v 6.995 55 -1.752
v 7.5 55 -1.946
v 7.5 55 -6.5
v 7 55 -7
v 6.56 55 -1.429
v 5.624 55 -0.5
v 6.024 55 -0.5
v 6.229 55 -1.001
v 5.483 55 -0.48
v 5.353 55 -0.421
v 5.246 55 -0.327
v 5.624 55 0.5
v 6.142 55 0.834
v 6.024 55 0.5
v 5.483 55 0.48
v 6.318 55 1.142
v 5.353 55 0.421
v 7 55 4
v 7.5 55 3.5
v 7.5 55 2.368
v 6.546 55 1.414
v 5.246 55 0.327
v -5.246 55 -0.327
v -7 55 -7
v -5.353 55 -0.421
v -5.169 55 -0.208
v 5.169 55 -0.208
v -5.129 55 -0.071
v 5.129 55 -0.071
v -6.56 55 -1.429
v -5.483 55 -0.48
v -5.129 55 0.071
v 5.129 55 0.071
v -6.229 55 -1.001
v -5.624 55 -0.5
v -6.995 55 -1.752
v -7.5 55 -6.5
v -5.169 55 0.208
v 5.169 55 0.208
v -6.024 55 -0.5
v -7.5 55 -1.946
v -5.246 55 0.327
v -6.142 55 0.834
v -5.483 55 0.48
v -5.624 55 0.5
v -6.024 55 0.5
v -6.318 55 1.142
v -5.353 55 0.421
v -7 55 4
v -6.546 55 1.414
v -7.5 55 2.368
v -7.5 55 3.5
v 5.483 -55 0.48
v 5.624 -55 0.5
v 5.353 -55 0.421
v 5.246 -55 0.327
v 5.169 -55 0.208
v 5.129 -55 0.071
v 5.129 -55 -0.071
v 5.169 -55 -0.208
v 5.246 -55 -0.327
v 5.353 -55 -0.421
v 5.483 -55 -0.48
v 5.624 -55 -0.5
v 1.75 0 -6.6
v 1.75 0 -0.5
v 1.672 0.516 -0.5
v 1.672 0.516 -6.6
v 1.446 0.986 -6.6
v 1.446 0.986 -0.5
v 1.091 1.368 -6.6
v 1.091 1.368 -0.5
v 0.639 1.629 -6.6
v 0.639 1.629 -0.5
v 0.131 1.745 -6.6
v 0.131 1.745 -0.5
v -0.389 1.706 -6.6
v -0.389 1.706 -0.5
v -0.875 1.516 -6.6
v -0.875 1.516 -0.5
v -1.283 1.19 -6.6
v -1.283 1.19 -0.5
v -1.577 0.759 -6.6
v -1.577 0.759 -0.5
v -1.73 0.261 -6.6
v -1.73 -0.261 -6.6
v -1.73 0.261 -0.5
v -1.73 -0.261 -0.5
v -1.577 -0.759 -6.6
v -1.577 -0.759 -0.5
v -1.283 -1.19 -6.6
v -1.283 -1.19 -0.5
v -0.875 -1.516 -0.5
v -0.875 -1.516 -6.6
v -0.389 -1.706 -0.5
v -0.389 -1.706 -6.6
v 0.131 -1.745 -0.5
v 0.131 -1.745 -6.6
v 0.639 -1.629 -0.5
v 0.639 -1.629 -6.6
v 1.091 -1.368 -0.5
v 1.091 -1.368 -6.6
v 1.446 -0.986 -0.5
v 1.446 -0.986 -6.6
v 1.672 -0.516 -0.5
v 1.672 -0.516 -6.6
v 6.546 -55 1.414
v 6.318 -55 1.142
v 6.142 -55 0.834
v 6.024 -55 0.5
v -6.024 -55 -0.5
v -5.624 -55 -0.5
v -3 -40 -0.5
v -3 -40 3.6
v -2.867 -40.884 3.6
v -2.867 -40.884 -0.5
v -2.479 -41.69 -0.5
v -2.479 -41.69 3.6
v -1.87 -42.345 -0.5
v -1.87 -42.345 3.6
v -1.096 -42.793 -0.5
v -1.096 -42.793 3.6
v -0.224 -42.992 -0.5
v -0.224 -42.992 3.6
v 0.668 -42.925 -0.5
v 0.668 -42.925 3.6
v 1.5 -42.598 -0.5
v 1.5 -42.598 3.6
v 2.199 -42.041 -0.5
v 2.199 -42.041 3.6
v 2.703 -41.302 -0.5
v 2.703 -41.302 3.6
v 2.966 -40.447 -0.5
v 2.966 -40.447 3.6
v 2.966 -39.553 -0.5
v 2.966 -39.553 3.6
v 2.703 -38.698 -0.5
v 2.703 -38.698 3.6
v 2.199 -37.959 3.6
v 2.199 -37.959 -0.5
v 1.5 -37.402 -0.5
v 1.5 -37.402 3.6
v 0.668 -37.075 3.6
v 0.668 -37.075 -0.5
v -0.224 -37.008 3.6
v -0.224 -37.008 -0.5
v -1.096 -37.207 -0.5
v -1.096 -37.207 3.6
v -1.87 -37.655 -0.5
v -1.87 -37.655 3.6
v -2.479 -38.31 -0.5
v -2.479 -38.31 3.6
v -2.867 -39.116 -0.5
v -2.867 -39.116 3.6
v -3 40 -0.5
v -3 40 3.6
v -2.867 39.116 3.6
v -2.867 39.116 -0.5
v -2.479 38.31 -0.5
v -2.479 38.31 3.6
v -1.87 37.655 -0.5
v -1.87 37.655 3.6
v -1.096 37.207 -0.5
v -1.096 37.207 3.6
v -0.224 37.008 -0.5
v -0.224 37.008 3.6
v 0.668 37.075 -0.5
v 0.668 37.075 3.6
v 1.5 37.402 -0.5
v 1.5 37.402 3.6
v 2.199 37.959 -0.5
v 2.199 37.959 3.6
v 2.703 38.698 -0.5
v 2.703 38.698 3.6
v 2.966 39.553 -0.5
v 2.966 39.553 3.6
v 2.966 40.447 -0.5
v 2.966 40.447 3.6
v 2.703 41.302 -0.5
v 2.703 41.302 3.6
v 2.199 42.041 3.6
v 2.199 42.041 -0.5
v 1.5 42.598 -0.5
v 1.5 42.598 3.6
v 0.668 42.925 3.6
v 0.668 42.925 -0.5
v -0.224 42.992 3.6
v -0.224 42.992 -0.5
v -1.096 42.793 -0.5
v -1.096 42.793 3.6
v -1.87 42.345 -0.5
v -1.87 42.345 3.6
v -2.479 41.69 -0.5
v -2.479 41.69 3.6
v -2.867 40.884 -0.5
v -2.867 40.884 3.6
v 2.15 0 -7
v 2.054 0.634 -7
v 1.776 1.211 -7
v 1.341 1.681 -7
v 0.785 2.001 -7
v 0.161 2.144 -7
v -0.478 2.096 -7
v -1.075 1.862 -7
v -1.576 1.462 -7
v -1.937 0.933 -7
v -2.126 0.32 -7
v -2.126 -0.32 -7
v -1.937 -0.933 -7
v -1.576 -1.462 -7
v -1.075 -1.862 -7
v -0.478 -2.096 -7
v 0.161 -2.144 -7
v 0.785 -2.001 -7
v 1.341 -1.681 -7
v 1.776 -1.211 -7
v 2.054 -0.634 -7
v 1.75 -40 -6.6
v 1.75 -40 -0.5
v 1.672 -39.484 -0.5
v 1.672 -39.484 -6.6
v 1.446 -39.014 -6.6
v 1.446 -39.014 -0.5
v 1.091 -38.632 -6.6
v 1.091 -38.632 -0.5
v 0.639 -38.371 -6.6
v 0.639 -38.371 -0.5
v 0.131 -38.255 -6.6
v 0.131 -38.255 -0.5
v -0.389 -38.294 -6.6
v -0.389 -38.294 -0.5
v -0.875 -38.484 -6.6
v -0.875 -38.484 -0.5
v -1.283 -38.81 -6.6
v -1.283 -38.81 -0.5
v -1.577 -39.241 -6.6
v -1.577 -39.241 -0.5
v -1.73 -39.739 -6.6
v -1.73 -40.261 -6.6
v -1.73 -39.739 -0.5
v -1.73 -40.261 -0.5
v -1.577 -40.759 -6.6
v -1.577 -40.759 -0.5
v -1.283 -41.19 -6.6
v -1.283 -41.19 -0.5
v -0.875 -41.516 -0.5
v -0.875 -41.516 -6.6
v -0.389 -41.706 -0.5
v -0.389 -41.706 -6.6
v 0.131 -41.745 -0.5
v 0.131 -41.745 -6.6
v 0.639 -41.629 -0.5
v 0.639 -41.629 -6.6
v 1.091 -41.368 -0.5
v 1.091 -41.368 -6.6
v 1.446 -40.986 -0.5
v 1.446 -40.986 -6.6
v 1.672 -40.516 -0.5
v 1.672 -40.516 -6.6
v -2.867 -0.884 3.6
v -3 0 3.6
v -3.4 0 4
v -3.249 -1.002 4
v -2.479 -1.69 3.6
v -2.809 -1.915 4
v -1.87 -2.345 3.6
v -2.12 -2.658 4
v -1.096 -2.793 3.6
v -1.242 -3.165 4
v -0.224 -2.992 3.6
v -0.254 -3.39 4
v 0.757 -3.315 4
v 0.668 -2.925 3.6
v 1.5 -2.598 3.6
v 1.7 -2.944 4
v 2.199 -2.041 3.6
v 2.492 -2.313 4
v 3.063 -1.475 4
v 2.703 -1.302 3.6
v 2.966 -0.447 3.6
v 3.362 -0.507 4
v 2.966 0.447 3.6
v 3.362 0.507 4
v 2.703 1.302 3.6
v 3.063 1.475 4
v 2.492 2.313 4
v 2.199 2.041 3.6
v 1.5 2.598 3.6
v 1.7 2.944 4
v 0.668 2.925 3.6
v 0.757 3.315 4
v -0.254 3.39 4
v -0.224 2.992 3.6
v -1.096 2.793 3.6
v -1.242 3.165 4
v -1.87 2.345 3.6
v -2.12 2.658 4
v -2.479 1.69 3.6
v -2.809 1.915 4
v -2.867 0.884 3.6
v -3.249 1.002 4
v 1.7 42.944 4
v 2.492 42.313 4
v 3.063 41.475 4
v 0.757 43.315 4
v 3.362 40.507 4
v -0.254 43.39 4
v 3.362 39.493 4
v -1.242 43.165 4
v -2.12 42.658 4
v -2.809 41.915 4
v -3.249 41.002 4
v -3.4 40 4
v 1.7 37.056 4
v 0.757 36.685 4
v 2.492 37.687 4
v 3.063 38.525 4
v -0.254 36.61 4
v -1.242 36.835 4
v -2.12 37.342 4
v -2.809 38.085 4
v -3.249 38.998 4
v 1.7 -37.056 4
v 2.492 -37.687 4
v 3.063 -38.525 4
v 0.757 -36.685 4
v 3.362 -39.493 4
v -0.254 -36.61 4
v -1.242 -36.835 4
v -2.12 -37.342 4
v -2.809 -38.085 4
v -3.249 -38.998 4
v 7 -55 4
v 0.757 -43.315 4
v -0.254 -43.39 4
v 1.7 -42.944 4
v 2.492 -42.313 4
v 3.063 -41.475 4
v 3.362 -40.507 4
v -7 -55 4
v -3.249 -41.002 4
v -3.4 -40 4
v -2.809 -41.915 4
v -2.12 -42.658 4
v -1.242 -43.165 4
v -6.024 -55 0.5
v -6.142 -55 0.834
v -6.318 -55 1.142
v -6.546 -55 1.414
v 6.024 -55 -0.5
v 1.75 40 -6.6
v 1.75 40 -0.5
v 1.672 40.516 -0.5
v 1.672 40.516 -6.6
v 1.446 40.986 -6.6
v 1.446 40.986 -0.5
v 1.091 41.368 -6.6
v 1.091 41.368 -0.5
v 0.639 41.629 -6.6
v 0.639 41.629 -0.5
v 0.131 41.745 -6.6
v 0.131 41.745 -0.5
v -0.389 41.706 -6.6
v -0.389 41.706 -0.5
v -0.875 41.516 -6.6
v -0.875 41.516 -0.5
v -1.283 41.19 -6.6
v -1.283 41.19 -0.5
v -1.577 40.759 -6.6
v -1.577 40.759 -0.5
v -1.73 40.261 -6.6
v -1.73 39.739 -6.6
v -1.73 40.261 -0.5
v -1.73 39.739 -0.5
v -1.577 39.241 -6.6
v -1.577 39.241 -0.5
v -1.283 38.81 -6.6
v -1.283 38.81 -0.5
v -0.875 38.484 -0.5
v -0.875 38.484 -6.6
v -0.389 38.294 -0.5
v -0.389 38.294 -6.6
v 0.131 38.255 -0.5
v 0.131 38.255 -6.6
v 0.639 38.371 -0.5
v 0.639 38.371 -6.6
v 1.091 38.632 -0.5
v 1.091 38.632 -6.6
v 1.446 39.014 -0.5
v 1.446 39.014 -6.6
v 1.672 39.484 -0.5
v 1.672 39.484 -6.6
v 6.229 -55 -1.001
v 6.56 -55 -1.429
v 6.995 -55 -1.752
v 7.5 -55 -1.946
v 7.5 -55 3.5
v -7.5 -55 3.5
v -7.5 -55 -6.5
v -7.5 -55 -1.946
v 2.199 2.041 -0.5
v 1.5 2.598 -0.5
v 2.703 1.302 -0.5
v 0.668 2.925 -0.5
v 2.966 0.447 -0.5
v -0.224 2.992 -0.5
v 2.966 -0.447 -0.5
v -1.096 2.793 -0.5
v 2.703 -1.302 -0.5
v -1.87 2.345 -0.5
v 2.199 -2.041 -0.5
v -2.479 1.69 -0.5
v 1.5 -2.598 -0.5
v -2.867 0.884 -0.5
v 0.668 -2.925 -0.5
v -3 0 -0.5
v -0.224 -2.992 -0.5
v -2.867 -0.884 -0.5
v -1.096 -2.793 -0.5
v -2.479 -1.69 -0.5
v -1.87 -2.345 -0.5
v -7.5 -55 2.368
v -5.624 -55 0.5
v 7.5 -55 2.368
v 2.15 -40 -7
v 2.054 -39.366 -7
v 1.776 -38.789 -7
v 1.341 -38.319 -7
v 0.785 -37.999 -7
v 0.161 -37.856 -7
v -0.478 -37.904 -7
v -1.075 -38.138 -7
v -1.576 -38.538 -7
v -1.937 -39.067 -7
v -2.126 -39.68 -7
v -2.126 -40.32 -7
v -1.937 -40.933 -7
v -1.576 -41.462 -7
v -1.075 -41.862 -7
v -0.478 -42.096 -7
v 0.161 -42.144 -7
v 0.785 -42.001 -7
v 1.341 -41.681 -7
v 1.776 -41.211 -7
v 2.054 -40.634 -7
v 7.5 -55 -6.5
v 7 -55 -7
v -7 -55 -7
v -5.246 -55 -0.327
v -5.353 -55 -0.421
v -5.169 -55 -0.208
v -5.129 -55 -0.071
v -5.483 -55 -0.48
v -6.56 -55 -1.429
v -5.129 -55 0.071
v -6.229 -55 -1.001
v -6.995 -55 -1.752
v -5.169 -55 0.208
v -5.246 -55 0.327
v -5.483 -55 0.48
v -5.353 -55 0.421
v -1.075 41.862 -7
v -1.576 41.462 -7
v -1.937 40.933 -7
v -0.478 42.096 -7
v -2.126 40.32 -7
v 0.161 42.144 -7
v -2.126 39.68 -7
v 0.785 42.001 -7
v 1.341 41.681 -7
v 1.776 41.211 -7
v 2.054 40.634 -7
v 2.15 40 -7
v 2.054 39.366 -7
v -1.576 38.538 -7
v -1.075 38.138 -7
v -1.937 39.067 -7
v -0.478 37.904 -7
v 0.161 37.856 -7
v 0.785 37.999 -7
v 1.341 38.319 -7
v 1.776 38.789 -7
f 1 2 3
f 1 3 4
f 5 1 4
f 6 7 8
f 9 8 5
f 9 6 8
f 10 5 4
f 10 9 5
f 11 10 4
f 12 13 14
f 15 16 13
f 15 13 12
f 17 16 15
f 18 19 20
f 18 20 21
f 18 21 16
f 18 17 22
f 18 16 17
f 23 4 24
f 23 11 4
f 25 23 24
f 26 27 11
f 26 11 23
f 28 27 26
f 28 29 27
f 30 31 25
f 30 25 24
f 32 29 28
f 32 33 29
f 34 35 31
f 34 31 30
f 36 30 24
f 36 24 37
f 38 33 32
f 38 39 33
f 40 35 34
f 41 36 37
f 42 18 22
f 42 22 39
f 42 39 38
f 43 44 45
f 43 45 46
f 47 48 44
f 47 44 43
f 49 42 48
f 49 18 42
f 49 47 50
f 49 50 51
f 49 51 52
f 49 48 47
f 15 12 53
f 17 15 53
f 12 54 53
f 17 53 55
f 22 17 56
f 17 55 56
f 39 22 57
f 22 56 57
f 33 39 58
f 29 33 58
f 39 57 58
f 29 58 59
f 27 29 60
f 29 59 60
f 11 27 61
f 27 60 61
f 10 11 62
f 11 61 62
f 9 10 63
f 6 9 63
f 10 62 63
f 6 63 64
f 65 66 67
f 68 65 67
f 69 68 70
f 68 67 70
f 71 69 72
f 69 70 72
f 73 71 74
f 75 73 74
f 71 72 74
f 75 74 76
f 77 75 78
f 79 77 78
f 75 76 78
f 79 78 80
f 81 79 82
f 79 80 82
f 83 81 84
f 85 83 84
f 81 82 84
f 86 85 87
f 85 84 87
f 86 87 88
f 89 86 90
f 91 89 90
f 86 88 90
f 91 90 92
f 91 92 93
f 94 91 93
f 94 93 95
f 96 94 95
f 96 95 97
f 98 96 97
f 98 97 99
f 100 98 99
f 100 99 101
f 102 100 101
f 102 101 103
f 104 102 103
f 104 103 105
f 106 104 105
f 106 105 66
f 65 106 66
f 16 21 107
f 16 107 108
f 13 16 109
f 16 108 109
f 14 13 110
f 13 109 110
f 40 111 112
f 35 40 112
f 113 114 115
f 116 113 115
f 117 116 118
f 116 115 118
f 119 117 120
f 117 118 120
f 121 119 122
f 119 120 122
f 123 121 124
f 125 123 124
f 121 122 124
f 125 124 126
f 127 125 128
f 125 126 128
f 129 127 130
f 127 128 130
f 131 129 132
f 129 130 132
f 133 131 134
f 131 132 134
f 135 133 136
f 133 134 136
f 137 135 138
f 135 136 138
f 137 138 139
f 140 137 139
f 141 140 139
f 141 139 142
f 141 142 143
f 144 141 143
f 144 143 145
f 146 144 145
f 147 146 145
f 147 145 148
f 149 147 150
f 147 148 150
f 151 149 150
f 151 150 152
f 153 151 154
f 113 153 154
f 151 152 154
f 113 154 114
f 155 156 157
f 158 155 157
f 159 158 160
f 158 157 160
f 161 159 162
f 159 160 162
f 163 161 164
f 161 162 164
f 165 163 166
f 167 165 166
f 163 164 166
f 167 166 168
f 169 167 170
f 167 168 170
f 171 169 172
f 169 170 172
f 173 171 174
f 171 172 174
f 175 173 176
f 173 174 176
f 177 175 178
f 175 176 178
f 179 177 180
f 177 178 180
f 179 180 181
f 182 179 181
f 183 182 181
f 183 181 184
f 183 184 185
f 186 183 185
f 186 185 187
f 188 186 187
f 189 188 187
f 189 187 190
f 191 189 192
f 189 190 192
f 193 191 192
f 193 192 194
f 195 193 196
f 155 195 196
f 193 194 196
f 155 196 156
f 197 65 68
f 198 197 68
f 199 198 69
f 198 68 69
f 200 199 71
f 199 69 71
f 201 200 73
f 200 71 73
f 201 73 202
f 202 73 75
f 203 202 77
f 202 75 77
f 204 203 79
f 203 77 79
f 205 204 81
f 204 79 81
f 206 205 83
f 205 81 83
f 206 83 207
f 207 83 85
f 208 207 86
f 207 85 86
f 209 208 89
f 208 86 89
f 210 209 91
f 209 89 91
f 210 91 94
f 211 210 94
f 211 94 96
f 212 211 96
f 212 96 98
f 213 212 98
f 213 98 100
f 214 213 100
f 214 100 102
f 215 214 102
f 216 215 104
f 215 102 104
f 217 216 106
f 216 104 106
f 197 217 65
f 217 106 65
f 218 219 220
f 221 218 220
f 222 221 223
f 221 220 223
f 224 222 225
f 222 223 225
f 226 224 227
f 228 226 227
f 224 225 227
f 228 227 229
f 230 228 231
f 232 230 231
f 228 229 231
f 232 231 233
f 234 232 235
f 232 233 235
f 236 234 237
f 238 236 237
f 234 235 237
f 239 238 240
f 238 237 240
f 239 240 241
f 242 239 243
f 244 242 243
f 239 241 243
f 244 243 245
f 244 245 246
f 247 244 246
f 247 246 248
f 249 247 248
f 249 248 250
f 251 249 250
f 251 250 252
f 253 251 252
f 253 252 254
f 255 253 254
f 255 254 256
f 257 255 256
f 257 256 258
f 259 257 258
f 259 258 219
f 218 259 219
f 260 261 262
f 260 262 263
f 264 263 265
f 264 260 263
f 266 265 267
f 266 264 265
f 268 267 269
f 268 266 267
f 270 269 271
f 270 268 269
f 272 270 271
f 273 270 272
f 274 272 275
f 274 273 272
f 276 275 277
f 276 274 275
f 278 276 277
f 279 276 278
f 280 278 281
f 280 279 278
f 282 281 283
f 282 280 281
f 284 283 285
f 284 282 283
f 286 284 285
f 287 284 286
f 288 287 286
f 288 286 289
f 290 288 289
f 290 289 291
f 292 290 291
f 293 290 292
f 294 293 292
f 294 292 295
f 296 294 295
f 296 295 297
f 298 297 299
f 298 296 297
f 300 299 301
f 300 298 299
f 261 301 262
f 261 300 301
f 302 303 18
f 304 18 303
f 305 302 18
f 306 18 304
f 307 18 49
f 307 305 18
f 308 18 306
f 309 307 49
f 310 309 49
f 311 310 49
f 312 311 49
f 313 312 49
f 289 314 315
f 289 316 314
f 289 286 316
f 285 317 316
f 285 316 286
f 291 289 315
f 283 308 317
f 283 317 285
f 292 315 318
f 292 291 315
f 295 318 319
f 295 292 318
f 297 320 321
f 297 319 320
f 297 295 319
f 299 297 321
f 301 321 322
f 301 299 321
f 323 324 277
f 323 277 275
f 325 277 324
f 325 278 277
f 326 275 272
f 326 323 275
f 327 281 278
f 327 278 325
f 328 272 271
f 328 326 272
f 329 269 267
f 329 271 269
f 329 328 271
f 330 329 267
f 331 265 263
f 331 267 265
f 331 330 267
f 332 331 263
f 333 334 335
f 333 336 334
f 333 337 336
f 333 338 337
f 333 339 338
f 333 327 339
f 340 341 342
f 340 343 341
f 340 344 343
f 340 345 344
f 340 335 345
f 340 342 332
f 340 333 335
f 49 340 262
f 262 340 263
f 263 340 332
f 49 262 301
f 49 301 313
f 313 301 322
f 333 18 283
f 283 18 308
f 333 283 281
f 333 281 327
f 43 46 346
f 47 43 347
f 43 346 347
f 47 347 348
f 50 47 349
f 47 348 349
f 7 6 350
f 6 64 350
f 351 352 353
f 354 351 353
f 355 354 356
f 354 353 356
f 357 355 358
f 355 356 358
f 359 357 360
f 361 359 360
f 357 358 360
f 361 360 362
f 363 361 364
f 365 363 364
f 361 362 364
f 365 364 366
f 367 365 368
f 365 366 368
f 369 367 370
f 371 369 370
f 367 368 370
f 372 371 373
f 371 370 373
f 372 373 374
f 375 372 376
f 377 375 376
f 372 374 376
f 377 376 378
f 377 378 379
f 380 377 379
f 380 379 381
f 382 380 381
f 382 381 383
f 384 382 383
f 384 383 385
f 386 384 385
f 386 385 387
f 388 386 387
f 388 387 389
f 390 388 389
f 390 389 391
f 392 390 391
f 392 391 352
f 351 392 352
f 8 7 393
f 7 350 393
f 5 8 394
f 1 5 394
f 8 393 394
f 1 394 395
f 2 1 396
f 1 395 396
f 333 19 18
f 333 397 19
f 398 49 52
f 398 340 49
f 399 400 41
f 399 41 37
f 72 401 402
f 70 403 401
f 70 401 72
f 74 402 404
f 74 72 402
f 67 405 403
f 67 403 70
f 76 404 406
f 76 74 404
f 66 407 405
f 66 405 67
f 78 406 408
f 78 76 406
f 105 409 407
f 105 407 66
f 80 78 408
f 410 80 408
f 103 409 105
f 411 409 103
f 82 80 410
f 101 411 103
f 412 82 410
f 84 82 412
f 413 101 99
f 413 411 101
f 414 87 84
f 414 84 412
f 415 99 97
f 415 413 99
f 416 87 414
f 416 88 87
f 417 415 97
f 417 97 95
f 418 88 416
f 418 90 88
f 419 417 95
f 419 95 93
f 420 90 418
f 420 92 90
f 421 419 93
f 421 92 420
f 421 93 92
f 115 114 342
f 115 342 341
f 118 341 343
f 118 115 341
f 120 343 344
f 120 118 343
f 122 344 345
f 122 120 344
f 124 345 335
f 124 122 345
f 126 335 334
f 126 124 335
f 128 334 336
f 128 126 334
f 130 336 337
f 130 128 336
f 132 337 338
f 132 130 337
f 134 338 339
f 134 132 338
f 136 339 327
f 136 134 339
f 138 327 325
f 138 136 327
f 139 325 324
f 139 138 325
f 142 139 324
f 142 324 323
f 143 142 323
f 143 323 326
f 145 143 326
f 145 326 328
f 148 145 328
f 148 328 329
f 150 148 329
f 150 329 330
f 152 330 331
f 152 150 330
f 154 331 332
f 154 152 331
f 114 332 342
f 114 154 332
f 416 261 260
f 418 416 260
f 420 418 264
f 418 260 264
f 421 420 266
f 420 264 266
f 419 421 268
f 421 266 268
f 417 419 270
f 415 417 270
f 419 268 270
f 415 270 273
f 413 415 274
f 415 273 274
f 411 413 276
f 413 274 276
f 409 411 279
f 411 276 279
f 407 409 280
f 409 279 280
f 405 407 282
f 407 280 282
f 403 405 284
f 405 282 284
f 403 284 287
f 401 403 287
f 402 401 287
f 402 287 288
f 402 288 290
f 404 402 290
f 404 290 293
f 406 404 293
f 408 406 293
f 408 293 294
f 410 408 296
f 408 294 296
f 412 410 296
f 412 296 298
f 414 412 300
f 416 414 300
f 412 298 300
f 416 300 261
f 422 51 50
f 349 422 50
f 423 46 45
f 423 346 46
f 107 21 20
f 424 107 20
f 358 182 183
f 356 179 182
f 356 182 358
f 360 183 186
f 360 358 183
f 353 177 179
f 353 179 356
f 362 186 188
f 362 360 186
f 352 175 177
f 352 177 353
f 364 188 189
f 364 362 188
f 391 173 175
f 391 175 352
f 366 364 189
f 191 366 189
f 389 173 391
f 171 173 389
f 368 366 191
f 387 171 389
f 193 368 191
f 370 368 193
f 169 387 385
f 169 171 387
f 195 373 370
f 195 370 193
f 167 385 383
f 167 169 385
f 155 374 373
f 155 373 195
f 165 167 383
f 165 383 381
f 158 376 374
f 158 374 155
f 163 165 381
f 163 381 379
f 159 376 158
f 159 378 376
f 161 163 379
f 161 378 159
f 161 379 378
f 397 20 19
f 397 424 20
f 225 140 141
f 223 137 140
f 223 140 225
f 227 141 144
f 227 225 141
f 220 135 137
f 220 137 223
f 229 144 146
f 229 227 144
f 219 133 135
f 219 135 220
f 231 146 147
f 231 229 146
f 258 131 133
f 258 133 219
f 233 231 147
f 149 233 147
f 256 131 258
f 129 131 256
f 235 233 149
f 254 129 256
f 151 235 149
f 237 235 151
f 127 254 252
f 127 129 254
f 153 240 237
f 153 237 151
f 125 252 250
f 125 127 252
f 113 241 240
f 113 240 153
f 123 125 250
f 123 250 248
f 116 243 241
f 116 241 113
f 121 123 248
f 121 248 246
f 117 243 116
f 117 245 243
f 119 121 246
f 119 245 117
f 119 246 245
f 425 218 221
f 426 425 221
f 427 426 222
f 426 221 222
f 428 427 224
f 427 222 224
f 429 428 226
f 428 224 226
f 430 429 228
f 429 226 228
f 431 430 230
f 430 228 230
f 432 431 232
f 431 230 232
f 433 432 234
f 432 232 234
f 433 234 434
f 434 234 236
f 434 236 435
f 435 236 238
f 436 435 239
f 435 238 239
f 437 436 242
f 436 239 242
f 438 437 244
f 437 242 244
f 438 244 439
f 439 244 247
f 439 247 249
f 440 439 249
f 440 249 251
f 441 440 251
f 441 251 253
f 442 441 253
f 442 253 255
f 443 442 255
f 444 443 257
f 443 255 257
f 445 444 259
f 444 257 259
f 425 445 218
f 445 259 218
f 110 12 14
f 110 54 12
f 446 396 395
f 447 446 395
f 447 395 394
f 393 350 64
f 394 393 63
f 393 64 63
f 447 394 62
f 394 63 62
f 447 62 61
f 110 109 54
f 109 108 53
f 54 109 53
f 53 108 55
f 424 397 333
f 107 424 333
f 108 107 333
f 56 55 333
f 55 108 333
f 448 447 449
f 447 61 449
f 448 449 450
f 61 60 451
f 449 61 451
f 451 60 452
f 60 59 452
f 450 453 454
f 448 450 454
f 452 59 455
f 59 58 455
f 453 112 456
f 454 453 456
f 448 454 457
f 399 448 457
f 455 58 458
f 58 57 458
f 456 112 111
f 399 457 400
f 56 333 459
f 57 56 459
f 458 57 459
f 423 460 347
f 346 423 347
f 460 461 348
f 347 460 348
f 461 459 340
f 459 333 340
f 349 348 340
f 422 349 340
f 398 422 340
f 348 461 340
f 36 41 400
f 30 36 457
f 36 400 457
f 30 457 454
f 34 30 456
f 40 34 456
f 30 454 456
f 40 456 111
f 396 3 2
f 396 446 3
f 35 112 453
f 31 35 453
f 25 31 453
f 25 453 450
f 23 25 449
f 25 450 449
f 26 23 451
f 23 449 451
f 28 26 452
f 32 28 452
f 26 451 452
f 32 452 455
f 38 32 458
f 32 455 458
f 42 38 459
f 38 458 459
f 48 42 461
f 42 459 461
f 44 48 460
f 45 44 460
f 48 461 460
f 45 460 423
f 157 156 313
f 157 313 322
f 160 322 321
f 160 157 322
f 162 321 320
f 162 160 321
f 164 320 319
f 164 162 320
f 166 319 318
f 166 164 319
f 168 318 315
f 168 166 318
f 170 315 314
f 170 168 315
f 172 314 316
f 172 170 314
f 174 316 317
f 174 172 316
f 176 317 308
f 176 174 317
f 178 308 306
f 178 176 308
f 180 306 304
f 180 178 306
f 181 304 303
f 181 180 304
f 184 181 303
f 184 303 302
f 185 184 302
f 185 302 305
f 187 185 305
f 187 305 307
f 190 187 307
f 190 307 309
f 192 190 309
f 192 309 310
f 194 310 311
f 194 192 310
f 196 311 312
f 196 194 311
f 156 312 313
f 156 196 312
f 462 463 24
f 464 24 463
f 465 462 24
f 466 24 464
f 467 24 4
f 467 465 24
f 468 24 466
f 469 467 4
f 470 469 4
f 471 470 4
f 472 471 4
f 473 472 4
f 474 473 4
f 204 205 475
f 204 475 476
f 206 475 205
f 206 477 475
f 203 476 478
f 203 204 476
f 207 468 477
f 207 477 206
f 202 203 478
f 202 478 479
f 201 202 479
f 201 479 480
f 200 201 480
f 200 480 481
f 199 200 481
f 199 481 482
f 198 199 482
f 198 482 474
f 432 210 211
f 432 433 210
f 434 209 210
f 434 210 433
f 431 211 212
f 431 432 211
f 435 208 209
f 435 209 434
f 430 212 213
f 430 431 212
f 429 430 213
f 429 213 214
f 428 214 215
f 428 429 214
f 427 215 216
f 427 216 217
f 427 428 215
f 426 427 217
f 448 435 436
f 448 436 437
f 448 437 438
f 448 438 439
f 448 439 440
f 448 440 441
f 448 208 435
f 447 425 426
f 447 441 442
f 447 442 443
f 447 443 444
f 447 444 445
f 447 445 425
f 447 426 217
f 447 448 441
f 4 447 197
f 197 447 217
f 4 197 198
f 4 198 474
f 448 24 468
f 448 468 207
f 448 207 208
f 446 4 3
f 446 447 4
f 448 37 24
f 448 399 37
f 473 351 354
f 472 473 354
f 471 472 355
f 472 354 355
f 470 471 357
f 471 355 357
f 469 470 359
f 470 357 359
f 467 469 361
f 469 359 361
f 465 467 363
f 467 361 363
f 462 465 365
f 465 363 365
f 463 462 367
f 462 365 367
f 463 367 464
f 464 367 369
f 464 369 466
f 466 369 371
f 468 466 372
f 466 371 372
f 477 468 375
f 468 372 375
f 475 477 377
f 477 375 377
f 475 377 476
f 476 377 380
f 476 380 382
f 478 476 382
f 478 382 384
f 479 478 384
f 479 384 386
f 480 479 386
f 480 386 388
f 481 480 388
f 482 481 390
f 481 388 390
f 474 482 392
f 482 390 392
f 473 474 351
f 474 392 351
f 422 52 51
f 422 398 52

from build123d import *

# Parameters (mm, degrees)
PAD_DEPTH            = 55
SKETCH015_R          = 1.75
POCKET002_DEPTH      = 7.001
POCKET002_DEPTH_BACK = 4.001
SKETCH016_R          = 3
POCKET003_DEPTH      = 4.5
CHAMFER002_SIZE      = 0.4


with BuildPart() as part:
    # Sketch014 → Pad (new body, symmetric)
    with BuildSketch(Plane.XZ):
        with BuildLine():
            ThreePointArc((-5.623508, -0.5), (-5.123508, 0), (-5.623508, 0.5))
            Line((-6.023508, 0.5), (-5.623508, 0.5))
            ThreePointArc((-6.023508, 0.5), (-6.223408, 0.992092), (-6.545786, 1.414214))
            Line((-7.5, 2.368427), (-6.545786, 1.414214))
            Line((-7.5, 3.5), (-7.5, 2.368427))
            Line((-7, 4), (-7.5, 3.5))
            Line((7, 4), (-7, 4))
            Line((7.5, 3.5), (7, 4))
            Line((7.5, 2.368427), (7.5, 3.5))
            Line((6.545786, 1.414214), (7.5, 2.368427))
            ThreePointArc((6.545786, 1.414214), (6.223408, 0.992092), (6.023508, 0.5))
            Line((5.623508, 0.5), (6.023508, 0.5))
            ThreePointArc((5.623508, 0.5), (5.123508, 0), (5.623508, -0.5))
            Line((5.623508, -0.5), (6.023508, -0.5))
            ThreePointArc((6.023508, -0.5), (6.560429, -1.428706), (7.5, -1.946381))
            Line((7.5, -6.5), (7.5, -1.946381))
            Line((7, -7), (7.5, -6.5))
            Line((-7, -7), (7, -7))
            Line((-7.5, -6.5), (-7, -7))
            Line((-7.5, -1.946381), (-7.5, -6.5))
            ThreePointArc((-7.5, -1.946381), (-6.560429, -1.428706), (-6.023508, -0.5))
            Line((-6.023508, -0.5), (-5.623508, -0.5))
        make_face()
    extrude(amount=PAD_DEPTH, both=True)

    # Sketch015 → Pocket002 (cut, two sides)
    with BuildSketch(Plane.XY) as pocket002_sk:
        with Locations((0, -40)):
            Circle(SKETCH015_R)
        Circle(SKETCH015_R)
        with Locations((0, 40)):
            Circle(SKETCH015_R)
    extrude(amount=-POCKET002_DEPTH, mode=Mode.SUBTRACT)
    extrude(pocket002_sk.sketch, amount=POCKET002_DEPTH_BACK, mode=Mode.SUBTRACT)

    # Sketch016 (on Face13 of Pocket002) → Pocket003 (cut)
    with BuildSketch(Plane(origin=(0, 0, 4), x_dir=(-1, 0, 0), z_dir=(0, 0, 1))):
        with Locations((0, 40)):
            Circle(SKETCH016_R)
        Circle(SKETCH016_R)
        with Locations((0, -40)):
            Circle(SKETCH016_R)
    extrude(amount=-POCKET003_DEPTH, mode=Mode.SUBTRACT)

    # Chamfer002
    chamfer002_edges = [part.edges().sort_by_distance(p)[0] for p in [
        (-1.75, -40, -7),
        (-1.75, 0, -7),
        (-1.75, 40, -7),
        (3, 40, 4),
        (3, 0, 4),
        (3, -40, 4),
    ]]
    chamfer(chamfer002_edges, length=CHAMFER002_SIZE)


solid = part.part
